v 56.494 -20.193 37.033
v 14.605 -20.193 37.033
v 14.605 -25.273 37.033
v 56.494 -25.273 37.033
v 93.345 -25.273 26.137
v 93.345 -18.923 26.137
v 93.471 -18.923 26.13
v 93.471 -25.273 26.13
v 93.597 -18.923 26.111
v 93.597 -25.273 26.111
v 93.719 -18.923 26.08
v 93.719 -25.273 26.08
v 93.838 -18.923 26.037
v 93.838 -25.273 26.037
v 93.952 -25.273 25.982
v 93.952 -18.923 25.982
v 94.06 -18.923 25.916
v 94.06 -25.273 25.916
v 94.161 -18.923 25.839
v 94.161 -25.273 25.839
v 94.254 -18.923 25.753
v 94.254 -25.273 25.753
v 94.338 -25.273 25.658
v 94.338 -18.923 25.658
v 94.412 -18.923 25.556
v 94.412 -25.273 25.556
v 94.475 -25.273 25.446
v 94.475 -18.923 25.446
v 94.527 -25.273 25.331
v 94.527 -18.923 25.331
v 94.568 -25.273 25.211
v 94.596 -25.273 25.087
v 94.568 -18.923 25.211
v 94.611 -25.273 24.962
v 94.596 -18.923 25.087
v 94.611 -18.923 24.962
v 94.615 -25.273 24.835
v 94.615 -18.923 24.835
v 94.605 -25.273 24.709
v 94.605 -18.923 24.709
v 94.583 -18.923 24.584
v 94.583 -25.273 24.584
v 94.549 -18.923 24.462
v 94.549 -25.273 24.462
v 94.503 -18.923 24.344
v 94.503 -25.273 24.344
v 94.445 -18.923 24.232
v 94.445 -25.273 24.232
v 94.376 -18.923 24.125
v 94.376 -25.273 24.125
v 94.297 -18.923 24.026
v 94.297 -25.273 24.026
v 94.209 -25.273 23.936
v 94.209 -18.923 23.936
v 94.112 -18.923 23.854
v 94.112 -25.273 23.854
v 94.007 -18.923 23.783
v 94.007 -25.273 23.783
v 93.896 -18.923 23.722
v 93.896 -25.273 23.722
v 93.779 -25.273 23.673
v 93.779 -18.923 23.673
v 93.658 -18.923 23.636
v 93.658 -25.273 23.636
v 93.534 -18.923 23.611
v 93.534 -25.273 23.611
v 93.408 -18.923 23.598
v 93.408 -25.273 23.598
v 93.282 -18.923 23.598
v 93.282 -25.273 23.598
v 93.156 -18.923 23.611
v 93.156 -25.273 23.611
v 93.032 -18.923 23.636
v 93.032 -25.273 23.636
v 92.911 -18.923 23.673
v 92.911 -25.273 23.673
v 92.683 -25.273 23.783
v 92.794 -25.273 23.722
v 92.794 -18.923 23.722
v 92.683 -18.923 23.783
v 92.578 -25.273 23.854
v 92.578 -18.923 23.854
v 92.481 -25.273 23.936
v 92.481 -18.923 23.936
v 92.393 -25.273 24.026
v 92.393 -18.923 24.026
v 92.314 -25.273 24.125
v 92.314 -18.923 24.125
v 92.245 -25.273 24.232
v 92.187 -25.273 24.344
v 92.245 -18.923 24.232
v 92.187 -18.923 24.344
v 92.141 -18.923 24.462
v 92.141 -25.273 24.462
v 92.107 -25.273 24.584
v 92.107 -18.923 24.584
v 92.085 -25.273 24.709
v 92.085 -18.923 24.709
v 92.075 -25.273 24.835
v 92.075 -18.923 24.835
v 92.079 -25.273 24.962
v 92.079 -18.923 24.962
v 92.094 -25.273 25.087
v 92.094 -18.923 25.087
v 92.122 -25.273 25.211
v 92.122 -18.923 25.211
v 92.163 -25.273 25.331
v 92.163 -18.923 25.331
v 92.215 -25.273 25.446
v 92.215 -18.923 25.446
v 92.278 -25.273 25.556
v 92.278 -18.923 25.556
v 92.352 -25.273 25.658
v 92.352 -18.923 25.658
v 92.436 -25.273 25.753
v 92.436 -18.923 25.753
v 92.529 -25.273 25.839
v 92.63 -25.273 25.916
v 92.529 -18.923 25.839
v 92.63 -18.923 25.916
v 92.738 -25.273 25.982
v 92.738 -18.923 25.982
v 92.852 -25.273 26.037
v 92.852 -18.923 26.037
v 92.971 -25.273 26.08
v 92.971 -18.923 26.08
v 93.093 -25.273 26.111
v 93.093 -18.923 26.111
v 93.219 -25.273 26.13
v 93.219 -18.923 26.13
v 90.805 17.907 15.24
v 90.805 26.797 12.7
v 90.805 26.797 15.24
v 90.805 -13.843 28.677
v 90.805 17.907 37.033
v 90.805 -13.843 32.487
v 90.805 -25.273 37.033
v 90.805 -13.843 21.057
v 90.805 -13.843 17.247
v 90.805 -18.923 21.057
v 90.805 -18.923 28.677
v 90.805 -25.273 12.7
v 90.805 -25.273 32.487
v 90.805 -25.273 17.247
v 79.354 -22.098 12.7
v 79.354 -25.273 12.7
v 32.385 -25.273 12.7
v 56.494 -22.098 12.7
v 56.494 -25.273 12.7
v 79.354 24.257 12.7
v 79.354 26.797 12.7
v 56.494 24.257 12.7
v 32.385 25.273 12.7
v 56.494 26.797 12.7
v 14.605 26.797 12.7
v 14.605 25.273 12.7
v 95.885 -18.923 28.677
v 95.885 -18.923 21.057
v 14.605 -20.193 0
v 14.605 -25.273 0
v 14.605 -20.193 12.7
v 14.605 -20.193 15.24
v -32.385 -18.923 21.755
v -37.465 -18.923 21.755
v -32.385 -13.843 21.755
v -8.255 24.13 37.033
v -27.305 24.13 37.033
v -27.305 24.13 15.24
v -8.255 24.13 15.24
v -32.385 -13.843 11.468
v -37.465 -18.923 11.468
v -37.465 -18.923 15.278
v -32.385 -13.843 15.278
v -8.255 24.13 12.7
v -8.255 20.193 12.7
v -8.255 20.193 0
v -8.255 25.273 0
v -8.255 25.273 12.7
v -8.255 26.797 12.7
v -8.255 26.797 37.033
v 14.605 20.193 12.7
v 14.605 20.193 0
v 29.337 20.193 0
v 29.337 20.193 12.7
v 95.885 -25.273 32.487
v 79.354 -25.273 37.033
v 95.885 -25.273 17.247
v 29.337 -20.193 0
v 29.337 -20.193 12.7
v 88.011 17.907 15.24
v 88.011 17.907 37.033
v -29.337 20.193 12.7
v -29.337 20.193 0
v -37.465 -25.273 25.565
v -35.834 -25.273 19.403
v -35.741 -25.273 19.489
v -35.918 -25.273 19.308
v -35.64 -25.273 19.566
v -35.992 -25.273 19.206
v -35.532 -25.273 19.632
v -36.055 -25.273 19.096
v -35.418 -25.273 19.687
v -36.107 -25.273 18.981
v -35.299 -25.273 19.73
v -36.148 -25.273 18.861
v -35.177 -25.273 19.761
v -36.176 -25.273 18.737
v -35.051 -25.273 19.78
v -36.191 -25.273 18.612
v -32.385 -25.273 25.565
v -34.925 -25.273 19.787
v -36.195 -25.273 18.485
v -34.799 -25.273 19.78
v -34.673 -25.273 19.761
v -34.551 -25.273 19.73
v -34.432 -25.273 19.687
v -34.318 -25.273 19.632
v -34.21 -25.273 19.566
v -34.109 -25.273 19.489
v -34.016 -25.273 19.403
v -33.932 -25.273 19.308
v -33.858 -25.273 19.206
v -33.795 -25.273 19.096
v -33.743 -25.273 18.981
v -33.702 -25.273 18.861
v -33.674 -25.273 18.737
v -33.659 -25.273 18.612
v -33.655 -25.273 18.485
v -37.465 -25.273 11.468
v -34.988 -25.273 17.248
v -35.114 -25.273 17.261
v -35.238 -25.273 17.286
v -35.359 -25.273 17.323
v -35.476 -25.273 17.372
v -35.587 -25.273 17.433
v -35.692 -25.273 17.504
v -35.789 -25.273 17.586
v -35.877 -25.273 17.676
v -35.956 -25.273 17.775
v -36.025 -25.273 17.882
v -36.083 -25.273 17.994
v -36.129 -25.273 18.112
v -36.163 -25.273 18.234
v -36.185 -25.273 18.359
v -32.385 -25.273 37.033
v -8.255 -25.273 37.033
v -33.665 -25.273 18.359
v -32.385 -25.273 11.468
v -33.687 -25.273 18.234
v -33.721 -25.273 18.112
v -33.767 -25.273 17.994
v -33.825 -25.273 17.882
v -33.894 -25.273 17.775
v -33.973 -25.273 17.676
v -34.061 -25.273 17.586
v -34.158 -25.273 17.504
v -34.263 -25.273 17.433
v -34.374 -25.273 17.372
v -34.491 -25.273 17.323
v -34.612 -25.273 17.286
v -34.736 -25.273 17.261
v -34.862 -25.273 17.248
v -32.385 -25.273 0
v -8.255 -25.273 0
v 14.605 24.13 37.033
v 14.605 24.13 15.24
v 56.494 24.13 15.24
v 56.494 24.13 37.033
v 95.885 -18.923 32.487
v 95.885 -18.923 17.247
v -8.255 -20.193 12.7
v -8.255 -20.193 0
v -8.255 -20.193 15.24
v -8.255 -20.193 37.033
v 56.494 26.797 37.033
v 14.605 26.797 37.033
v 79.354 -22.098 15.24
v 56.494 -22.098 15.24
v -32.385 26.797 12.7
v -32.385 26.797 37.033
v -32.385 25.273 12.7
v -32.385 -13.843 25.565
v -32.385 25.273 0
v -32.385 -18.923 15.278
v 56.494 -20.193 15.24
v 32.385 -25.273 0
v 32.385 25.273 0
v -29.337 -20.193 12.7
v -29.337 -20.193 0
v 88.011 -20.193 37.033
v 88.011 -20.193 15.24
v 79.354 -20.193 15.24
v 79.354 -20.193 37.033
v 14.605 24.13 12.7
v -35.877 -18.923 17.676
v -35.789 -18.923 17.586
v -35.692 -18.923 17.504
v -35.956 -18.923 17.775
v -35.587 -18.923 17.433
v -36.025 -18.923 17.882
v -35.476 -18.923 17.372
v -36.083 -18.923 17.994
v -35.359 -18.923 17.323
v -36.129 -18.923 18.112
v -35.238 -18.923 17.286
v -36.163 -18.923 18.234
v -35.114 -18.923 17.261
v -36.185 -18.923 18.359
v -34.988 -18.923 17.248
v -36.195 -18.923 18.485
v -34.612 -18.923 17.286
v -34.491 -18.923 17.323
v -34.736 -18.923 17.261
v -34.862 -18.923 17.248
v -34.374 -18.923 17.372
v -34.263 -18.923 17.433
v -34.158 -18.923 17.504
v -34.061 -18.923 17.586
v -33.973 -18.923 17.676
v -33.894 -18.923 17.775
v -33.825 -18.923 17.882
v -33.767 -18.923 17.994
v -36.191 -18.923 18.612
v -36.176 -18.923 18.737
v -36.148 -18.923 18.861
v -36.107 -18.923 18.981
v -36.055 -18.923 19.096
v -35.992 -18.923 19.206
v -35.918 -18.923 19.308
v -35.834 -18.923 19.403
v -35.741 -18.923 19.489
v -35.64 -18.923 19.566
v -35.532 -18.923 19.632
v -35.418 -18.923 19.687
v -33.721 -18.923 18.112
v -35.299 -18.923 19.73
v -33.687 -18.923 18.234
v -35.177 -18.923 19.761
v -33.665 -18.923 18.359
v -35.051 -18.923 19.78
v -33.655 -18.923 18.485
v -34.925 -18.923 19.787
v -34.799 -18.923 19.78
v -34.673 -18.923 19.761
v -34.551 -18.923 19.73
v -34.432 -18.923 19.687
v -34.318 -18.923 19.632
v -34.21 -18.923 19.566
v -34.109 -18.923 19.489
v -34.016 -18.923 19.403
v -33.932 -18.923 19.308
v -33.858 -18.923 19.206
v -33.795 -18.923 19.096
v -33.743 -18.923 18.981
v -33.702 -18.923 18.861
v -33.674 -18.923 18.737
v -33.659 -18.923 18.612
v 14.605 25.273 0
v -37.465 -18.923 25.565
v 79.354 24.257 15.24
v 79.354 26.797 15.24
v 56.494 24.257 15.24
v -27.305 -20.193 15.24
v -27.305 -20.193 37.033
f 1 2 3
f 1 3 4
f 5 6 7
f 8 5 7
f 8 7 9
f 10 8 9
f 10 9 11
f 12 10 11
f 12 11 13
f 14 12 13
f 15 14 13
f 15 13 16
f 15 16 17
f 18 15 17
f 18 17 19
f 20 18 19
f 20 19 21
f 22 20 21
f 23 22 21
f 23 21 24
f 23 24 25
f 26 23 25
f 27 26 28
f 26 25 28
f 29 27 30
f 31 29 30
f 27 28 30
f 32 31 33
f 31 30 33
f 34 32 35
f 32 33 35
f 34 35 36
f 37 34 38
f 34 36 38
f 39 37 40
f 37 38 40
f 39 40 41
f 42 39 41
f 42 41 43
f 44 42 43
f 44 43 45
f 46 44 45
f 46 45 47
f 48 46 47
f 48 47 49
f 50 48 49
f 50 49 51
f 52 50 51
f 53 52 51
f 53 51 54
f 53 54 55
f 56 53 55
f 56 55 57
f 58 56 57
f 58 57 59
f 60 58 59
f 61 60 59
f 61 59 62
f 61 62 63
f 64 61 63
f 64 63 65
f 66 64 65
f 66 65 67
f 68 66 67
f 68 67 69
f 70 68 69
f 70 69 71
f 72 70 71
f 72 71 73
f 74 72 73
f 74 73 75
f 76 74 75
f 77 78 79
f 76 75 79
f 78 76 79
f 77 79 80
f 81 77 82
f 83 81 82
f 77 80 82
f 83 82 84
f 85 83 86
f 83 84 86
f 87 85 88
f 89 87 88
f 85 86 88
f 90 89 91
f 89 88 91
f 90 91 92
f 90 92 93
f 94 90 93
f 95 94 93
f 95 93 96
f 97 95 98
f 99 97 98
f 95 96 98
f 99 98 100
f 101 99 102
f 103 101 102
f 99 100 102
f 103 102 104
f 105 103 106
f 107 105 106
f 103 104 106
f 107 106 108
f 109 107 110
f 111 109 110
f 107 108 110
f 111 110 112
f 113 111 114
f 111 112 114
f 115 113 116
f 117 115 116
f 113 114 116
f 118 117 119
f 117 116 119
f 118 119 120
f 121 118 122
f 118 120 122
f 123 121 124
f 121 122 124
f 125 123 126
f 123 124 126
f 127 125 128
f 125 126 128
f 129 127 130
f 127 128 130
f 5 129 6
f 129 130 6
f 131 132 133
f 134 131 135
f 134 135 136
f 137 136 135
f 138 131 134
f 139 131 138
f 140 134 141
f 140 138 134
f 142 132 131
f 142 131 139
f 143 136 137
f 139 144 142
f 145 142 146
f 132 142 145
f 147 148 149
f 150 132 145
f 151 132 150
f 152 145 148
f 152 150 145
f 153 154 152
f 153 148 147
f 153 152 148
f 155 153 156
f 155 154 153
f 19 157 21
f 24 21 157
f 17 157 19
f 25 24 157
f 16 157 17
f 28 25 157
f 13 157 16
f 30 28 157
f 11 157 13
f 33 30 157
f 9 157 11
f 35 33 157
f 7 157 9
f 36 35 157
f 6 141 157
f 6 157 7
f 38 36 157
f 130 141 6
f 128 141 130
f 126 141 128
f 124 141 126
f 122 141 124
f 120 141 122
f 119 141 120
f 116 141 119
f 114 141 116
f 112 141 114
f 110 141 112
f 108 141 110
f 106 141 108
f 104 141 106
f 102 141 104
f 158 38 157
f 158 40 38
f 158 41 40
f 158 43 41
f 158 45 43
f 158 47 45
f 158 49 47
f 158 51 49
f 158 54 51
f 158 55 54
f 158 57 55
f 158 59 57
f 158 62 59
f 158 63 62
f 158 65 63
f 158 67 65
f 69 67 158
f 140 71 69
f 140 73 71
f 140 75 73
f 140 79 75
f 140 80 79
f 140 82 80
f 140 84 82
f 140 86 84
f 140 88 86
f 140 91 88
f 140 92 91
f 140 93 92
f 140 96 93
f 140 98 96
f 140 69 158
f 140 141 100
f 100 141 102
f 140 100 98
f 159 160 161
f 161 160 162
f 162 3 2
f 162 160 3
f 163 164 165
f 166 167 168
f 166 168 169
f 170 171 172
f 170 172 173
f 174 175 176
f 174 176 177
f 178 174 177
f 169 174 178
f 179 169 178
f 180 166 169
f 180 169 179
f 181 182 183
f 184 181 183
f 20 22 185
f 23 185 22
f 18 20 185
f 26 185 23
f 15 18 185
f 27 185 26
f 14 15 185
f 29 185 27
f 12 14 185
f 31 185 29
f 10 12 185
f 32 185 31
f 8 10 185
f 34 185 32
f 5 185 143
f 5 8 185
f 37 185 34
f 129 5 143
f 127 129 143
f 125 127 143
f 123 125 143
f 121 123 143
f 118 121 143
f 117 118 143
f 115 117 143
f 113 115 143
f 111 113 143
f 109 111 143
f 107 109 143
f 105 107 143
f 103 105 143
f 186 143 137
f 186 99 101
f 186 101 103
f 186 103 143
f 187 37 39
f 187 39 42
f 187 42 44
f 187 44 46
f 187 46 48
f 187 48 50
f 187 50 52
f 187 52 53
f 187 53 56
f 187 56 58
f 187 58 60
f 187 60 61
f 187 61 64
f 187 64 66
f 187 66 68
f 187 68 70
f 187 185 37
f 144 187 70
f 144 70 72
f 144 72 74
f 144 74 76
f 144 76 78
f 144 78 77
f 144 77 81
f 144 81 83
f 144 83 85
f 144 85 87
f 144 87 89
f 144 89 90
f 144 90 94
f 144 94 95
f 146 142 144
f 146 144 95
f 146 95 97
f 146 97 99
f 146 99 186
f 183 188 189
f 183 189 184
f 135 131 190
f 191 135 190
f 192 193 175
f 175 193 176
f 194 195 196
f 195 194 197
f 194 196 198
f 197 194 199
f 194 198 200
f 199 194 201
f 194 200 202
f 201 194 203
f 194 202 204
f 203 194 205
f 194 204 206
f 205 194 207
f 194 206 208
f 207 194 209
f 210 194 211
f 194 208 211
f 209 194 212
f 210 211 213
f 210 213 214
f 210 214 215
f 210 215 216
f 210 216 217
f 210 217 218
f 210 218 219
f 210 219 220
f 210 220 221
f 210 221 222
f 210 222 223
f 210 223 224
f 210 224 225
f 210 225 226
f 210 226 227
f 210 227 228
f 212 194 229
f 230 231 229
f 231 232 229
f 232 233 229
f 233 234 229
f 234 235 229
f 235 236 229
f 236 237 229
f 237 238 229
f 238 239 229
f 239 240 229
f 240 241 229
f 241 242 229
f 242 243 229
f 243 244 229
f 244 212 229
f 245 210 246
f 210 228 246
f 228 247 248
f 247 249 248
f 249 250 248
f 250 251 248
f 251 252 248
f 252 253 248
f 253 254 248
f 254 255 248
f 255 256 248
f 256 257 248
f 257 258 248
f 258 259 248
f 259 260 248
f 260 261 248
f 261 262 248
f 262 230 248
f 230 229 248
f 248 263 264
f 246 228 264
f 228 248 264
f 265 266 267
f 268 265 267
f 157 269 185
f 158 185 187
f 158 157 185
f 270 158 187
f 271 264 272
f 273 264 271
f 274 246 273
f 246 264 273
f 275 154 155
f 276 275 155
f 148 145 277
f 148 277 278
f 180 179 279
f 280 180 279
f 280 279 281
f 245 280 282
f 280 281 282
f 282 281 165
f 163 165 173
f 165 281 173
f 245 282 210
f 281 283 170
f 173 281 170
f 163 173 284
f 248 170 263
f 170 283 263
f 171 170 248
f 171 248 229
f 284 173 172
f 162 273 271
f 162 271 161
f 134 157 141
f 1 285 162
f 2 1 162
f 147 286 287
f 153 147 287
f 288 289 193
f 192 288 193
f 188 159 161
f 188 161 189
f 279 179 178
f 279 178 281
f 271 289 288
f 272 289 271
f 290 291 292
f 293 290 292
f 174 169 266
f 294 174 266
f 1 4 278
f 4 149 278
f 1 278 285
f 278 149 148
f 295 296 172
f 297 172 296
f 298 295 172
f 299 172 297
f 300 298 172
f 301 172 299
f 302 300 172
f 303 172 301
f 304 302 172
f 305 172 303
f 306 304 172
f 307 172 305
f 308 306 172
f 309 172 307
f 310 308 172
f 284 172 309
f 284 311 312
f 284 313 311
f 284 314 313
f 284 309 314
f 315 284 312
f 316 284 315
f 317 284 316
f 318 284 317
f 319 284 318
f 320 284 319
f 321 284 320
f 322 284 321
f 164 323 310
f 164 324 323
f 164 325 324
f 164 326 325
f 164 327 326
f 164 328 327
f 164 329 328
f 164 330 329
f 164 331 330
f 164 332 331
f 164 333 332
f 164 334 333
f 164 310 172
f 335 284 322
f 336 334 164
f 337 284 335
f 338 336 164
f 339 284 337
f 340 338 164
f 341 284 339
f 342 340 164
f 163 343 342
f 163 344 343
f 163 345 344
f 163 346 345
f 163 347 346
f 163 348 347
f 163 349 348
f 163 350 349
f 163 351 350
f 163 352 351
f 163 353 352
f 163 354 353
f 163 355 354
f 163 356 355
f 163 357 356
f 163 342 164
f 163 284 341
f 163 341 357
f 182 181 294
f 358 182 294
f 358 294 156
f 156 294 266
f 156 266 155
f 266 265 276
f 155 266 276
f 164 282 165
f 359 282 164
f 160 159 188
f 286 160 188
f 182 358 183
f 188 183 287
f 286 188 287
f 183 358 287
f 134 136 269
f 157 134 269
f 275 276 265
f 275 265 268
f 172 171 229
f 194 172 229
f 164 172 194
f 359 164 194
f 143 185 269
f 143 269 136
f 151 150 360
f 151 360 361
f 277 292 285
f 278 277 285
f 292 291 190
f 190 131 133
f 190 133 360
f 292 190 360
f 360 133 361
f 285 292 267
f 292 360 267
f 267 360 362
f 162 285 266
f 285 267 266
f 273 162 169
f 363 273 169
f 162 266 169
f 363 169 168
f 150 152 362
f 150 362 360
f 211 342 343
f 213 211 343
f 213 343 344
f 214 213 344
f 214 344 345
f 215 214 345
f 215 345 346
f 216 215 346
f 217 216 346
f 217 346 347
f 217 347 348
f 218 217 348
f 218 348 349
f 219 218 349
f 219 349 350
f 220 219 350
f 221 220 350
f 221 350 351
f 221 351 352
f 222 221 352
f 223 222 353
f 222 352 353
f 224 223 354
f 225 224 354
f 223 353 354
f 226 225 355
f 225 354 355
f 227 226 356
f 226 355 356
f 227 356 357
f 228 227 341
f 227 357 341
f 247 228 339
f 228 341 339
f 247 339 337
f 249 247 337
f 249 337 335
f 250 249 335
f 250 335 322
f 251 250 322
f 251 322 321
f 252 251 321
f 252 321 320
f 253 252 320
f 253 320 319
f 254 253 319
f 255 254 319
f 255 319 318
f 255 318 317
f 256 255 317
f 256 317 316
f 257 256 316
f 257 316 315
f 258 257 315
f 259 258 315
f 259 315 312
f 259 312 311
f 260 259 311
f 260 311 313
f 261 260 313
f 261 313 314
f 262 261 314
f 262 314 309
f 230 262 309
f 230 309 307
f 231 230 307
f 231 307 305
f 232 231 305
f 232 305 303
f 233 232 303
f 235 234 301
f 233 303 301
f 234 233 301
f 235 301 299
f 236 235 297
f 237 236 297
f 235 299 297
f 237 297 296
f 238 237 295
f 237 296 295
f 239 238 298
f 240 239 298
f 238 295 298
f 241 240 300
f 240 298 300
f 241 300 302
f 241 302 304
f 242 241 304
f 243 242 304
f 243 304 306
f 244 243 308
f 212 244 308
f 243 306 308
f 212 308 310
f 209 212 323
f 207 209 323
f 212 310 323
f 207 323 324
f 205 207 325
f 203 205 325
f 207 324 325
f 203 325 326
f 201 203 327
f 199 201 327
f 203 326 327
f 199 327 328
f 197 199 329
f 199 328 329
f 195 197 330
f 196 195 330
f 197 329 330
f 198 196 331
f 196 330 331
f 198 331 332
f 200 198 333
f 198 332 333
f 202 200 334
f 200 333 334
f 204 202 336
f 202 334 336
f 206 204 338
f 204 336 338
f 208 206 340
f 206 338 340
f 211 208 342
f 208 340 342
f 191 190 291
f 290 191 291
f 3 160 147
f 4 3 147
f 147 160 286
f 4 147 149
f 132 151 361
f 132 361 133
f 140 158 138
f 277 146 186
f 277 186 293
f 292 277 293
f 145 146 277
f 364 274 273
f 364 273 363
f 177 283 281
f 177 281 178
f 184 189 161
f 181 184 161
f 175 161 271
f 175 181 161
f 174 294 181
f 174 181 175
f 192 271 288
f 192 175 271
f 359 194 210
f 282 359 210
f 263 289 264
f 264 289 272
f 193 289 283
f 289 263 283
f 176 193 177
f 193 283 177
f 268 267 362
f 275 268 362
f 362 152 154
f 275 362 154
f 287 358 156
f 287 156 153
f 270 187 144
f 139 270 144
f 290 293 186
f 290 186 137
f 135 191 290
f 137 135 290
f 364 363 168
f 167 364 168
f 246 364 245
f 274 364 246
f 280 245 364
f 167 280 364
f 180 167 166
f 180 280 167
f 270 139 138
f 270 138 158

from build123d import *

# Parameters (mm, degrees)
SKETCH1_W            = 64.77
SKETCH1_H            = 50.546
SKETCH1_W_2          = 58.674
SKETCH1_H_2          = 40.386
BOSS_EXTRUDE1_DEPTH  = 12.7
BOSS_EXTRUDE2_DEPTH  = 2.54
BOSS_EXTRUDE3_DEPTH  = 21.7932
SKETCH6_W            = 22.86
SKETCH6_H            = 2.667
SKETCH6_H_2          = 5.08
CUT_EXTRUDE1_DEPTH   = 102.661620763
SKETCH7_W            = 22.86
SKETCH7_H            = 5.08
SKETCH7_H_2          = 1.143
CUT_EXTRUDE2_DEPTH   = 12.7
SKETCH10_W           = 14.097
SKETCH10_H           = 6.35
BOSS_EXTRUDE4_DEPTH  = 5.08
BOSS_EXTRUDE5_DEPTH  = 3.81
SKETCH12_R           = 1.27
CUT_EXTRUDE3_DEPTH   = 109.200389682
BOSS_EXTRUDE7_DEPTH  = 3.81
SKETCH14_W           = 15.24
SKETCH14_H           = 6.35
BOSS_EXTRUDE8_DEPTH  = 5.08
SKETCH15_R           = 1.27
CUT_EXTRUDE4_DEPTH   = 113.497597873
BOSS_EXTRUDE9_DEPTH  = 3.81
BOSS_EXTRUDE10_DEPTH = 3.81


with BuildPart() as part:
    # Sketch1 → Boss-Extrude1 (new body)
    with BuildSketch(Plane.XY):
        Rectangle(SKETCH1_W, SKETCH1_H)
        Rectangle(SKETCH1_W_2, SKETCH1_H_2, mode=Mode.SUBTRACT)
    extrude(amount=BOSS_EXTRUDE1_DEPTH)

    # Sketch3 → Boss-Extrude2 (add)
    with BuildSketch(Plane.XY.offset(12.7)):
        Polygon((79.354012503, -25.273), (79.354012503, -22.098), (56.494012503, -22.098), (56.494012503, -25.273), (-32.385, -25.273), (-32.385, 26.797), (56.494012503, 26.797), (56.494012503, 24.257), (79.354012503, 24.257), (79.354012503, 26.797), (90.805, 26.797), (90.805, -25.273), align=None)
    extrude(amount=BOSS_EXTRUDE2_DEPTH)

    # Sketch5 → Boss-Extrude3 (add)
    with BuildSketch(Plane.XY.offset(15.24)):
        Polygon((-32.385, 26.797), (-32.385, -25.273), (56.494012503, -25.273), (56.494012503, -20.193), (-27.305, -20.193), (-27.305, 24.13), (56.494012503, 24.13), (56.494012503, 26.797), align=None)
        Polygon((79.354012503, -20.193), (79.354012503, -25.273), (90.805, -25.273), (90.805, 17.907), (88.011, 17.907), (88.011, -20.193), align=None)
    extrude(amount=BOSS_EXTRUDE3_DEPTH)

    # Sketch6 → Cut-Extrude1 (cut, through all)
    with BuildSketch(Plane.XY.offset(37.0332)):
        with Locations((3.175, 25.4635)):
            Rectangle(SKETCH6_W, SKETCH6_H)
        with Locations((3.175, -22.733)):
            Rectangle(SKETCH6_W, SKETCH6_H_2)
    extrude(amount=-CUT_EXTRUDE1_DEPTH, mode=Mode.SUBTRACT)

    # Sketch7 → Cut-Extrude2 (cut)
    with BuildSketch(Plane(origin=(0, 0, 0), x_dir=(-1, 0, 0), z_dir=(0, 0, -1))):
        with Locations((-3.175, 22.733)):
            Rectangle(SKETCH7_W, SKETCH7_H)
        with Locations((-3.175, -20.7645)):
            Rectangle(SKETCH7_W, SKETCH7_H_2)
    extrude(amount=-CUT_EXTRUDE2_DEPTH, mode=Mode.SUBTRACT)

    # Sketch10 → Boss-Extrude4 (add)
    with BuildSketch(Plane.ZY.offset(32.385)):
        with Locations((18.5166, -22.098)):
            Rectangle(SKETCH10_W, SKETCH10_H)
    extrude(amount=BOSS_EXTRUDE4_DEPTH)

    # Sketch11 → Boss-Extrude5 (add)
    with BuildSketch(Plane.XY.offset(25.5651)):
        Polygon((-37.465, -18.923), (-32.385, -18.923), (-32.385, -13.843), align=None)
    extrude(amount=-BOSS_EXTRUDE5_DEPTH)

    # Sketch12 → Cut-Extrude3 (cut, through all)
    with BuildSketch(Plane(origin=(0, -18.923, 0), x_dir=(1, 0, 0), z_dir=(0, 1, 0))):
        with Locations(Location((-34.925, -18.5166, 0), (0, 0, 270))):
            Circle(SKETCH12_R)
    extrude(amount=-CUT_EXTRUDE3_DEPTH, mode=Mode.SUBTRACT)

    # Sketch13 → Boss-Extrude7 (add)
    with BuildSketch(Plane(origin=(0, 0, 11.4681), x_dir=(-1, 0, 0), z_dir=(0, 0, -1))):
        Polygon((32.385, -13.843), (32.385, -18.923), (37.465, -18.923), align=None)
    extrude(amount=-BOSS_EXTRUDE7_DEPTH)

    # Sketch14 → Boss-Extrude8 (add)
    with BuildSketch(Plane(origin=(90.805, 0, 0), x_dir=(0, 0, -1), z_dir=(1, 0, 0))):
        with Locations((-24.8666, -22.098)):
            Rectangle(SKETCH14_W, SKETCH14_H)
    extrude(amount=BOSS_EXTRUDE8_DEPTH)

    # Sketch15 → Cut-Extrude4 (cut, through all)
    with BuildSketch(Plane(origin=(0, -18.923, 0), x_dir=(1, 0, 0), z_dir=(0, 1, 0))):
        with Locations(Location((93.345, -24.8666, 0), (0, 0, 270))):
            Circle(SKETCH15_R)
    extrude(amount=-CUT_EXTRUDE4_DEPTH, mode=Mode.SUBTRACT)

    # Sketch17 → Boss-Extrude9 (add)
    with BuildSketch(Plane.XY.offset(32.4866)):
        Polygon((95.885, -18.923), (90.805, -18.923), (90.805, -13.843), align=None)
    extrude(amount=-BOSS_EXTRUDE9_DEPTH)

    # Sketch18 → Boss-Extrude10 (add)
    with BuildSketch(Plane(origin=(0, 0, 17.2466), x_dir=(-1, 0, 0), z_dir=(0, 0, -1))):
        Polygon((-95.885, -18.923), (-90.805, -18.923), (-90.805, -13.843), align=None)
    extrude(amount=-BOSS_EXTRUDE10_DEPTH)


solid = part.part
